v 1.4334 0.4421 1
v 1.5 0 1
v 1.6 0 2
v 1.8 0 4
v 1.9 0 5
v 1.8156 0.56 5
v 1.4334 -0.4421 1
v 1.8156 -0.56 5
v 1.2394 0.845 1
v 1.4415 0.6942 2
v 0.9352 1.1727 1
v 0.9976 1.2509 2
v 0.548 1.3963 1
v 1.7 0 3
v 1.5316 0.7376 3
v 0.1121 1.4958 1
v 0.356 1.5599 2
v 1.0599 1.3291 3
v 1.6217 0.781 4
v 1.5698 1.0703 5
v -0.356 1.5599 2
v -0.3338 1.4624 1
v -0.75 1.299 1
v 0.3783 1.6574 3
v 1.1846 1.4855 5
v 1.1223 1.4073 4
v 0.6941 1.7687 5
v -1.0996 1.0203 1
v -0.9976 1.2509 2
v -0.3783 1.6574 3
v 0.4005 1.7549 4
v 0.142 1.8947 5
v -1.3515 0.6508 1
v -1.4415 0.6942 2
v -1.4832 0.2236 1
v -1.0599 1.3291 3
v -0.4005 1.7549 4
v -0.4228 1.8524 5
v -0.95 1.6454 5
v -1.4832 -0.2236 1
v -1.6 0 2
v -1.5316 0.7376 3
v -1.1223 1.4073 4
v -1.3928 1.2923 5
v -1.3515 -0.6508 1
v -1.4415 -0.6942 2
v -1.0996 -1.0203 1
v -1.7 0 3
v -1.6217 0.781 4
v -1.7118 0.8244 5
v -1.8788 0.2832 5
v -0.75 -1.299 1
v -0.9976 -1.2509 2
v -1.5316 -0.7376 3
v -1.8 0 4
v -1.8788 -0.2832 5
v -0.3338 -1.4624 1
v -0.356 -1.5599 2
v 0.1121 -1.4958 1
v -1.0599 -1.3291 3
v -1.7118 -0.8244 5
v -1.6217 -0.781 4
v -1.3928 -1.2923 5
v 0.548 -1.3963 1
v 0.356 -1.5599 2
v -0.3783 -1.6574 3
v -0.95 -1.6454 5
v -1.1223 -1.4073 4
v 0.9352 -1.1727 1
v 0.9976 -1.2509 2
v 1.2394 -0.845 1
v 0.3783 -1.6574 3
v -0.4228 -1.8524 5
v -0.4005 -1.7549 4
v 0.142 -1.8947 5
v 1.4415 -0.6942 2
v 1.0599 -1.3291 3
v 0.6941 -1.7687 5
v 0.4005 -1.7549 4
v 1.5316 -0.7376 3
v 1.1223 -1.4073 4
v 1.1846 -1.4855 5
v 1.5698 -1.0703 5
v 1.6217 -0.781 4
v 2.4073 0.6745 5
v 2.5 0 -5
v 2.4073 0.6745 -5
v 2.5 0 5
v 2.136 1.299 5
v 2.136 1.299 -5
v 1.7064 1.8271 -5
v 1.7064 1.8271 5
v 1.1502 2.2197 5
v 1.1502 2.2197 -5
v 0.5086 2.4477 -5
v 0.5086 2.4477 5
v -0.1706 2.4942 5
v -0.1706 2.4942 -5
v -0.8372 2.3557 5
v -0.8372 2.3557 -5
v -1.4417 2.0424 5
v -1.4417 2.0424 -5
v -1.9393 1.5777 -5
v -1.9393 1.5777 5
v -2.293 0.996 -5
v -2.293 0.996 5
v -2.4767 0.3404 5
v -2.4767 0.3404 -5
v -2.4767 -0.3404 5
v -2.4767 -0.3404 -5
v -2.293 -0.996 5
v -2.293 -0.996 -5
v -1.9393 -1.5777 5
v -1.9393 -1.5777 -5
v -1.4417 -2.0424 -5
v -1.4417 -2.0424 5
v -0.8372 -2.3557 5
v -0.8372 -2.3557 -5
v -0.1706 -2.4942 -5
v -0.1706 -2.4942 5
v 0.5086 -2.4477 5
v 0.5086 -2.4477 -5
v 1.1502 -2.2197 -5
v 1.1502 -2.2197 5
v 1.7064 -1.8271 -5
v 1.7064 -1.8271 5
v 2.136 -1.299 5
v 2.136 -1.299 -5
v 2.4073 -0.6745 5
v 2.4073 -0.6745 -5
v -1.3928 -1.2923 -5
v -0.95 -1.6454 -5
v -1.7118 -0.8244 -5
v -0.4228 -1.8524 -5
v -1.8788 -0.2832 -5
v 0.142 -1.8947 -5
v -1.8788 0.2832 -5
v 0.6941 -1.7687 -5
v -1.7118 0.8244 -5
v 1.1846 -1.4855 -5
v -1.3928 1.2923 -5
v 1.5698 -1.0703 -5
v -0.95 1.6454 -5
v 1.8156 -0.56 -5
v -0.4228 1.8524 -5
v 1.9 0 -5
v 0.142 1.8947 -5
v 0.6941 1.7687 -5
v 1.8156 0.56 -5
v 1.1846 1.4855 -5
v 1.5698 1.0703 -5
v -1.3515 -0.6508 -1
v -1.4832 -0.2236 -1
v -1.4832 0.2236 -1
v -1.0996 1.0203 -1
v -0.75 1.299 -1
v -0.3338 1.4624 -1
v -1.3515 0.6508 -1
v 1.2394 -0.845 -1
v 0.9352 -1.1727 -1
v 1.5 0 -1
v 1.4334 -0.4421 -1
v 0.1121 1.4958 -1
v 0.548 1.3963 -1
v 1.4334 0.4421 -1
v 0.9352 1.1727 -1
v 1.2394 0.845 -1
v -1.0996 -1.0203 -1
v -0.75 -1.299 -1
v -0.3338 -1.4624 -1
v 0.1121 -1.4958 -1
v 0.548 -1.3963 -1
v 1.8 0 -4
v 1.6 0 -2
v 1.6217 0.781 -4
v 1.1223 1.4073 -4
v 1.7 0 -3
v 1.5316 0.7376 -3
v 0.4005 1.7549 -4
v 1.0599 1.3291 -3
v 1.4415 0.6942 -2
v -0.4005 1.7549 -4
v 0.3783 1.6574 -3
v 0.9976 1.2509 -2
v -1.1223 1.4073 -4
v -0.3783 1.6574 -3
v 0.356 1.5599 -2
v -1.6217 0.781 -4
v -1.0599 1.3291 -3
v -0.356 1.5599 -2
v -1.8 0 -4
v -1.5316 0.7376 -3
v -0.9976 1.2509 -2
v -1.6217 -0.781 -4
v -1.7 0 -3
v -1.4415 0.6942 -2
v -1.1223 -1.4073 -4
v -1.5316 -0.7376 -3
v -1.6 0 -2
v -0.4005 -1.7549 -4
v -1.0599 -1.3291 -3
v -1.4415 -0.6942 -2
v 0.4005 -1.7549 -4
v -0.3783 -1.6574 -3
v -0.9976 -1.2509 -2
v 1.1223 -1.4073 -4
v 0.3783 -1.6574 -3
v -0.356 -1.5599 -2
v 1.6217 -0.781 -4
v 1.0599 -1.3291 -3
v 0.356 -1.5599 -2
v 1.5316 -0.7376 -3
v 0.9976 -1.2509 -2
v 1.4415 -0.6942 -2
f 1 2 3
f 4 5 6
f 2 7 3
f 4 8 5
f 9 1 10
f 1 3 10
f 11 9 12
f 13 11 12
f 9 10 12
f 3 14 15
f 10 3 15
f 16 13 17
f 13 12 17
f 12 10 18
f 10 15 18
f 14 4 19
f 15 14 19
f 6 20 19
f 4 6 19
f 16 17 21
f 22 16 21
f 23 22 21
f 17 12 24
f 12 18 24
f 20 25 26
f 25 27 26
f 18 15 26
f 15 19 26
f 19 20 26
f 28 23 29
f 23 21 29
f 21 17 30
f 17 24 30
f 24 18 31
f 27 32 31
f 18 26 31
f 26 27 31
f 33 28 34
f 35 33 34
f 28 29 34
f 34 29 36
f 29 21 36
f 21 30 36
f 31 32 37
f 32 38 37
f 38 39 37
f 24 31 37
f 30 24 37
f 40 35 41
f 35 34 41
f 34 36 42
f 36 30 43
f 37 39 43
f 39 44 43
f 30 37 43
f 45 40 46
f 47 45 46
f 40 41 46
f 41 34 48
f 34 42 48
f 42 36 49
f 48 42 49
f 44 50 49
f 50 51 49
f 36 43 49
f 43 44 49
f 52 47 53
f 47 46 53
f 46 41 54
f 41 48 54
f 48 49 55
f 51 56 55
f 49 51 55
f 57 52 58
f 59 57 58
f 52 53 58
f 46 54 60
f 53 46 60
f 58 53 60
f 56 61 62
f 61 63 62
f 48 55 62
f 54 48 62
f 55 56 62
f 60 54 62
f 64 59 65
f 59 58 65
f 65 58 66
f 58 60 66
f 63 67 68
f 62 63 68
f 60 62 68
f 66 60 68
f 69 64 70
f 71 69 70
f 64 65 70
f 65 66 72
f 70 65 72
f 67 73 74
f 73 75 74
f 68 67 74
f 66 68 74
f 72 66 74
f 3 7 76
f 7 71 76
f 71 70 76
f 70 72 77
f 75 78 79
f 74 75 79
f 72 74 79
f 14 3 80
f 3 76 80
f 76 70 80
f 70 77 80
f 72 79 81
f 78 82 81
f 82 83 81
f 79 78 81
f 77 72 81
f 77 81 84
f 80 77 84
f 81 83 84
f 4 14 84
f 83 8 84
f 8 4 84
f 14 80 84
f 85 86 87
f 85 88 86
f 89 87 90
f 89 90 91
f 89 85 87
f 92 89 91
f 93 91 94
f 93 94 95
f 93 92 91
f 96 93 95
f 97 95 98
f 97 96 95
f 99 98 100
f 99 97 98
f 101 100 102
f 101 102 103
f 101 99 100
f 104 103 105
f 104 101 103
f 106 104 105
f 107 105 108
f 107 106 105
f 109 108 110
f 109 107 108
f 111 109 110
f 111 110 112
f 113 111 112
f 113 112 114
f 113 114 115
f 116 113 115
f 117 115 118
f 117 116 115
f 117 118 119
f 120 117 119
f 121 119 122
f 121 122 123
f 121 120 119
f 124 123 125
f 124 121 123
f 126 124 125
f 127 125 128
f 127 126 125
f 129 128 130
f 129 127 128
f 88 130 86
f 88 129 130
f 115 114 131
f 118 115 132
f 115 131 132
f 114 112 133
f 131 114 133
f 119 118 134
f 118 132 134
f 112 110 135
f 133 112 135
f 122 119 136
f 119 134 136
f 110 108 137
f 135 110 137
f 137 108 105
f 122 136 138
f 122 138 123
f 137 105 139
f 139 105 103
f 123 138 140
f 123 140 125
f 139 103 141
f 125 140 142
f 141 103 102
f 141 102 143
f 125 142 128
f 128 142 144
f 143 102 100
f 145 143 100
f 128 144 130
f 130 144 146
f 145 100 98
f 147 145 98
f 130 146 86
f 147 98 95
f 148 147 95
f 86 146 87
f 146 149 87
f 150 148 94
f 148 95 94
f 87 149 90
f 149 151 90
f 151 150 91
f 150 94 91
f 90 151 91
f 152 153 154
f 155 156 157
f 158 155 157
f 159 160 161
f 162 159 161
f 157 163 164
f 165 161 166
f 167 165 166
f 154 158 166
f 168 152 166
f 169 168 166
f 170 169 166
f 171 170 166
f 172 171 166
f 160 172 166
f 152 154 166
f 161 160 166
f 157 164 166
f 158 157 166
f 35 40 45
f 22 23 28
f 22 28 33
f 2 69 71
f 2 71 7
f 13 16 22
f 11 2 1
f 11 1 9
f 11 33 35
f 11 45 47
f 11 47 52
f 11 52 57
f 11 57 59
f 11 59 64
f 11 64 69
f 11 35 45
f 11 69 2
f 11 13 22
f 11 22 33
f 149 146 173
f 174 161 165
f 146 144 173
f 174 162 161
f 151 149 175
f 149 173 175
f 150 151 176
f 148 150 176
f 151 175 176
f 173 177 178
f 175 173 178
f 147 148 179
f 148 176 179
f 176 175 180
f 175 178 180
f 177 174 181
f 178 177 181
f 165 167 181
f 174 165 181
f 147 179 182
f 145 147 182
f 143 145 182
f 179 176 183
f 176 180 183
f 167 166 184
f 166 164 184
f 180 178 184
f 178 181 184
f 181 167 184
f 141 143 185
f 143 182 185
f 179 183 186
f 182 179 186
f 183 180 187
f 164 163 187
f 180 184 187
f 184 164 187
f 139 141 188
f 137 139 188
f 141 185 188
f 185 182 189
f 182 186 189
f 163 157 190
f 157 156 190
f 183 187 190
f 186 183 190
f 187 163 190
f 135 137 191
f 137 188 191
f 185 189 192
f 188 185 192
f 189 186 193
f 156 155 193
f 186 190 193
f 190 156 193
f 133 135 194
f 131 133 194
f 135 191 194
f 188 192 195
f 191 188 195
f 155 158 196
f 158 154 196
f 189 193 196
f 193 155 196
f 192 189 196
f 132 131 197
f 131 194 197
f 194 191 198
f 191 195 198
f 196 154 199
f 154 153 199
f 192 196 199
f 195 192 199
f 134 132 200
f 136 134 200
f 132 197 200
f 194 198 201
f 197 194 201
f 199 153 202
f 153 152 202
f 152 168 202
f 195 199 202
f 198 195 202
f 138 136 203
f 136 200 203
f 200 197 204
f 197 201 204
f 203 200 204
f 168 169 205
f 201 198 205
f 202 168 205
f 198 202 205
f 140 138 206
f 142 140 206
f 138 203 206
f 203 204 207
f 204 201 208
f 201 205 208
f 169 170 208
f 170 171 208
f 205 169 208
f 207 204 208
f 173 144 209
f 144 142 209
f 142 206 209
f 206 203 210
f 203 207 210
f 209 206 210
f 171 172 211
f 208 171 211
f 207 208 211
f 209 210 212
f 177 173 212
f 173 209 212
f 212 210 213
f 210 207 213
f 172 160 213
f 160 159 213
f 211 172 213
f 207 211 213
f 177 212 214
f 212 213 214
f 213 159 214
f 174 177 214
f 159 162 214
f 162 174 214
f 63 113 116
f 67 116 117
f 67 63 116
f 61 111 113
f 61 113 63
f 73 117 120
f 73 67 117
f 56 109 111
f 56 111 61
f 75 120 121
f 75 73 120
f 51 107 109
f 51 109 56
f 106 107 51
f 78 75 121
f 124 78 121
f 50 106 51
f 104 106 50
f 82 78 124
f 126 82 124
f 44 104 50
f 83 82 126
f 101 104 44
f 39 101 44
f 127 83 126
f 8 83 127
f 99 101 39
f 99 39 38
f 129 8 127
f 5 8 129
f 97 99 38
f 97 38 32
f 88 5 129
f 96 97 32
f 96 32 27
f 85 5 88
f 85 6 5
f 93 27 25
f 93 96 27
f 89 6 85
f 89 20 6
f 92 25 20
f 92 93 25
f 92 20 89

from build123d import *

# Parameters (mm, degrees)
F0_R     = 1.5
F1_DEPTH = 1
F0_R_2   = 2.5
F2_DEPTH = 5
F3_SIZE2 = 0.39999
F3_SIZE  = 3.99999
F4_SIZE2 = 3.99999
F4_SIZE  = 0.39999


# Not quite as in the source:
# - a fillet or chamfer is up to 0.001 mm smaller than in the source, because OpenCascade refuses the exact size


with BuildPart() as f1:
    # F0 (on Top) → F1 (new body, symmetric)
    with BuildSketch(Plane.XY):
        Circle(F0_R)
    extrude(amount=F1_DEPTH, both=True)

    # F0 (on Top) → F2 (join, symmetric)
    with BuildSketch(Plane.XY):
        Circle(F0_R_2)
        Circle(F0_R, mode=Mode.SUBTRACT)
    extrude(amount=F2_DEPTH, both=True)

    # F3 (size 4 and 0.4 in the source; OpenCascade refuses exactly that, so slightly less here)
    f3_edges = [f1.edges().sort_by_distance(p)[0] for p in [
        (-1.5, 0, 5),
    ]]
    f3_side = f1.faces().sort_by_distance((-1.5, 0, 3))[0]
    chamfer(f3_edges, length=F3_SIZE, length2=F3_SIZE2, reference=f3_side)

    # F4 (size 0.4 and 4 in the source; OpenCascade refuses exactly that, so slightly less here)
    f4_edges = [f1.edges().sort_by_distance(p)[0] for p in [
        (-1.5, 0, -5),
    ]]
    f4_side = f1.faces().sort_by_distance((-2.429289, 0, -5))[0]
    chamfer(f4_edges, length=F4_SIZE, length2=F4_SIZE2, reference=f4_side)


solid = f1.part
